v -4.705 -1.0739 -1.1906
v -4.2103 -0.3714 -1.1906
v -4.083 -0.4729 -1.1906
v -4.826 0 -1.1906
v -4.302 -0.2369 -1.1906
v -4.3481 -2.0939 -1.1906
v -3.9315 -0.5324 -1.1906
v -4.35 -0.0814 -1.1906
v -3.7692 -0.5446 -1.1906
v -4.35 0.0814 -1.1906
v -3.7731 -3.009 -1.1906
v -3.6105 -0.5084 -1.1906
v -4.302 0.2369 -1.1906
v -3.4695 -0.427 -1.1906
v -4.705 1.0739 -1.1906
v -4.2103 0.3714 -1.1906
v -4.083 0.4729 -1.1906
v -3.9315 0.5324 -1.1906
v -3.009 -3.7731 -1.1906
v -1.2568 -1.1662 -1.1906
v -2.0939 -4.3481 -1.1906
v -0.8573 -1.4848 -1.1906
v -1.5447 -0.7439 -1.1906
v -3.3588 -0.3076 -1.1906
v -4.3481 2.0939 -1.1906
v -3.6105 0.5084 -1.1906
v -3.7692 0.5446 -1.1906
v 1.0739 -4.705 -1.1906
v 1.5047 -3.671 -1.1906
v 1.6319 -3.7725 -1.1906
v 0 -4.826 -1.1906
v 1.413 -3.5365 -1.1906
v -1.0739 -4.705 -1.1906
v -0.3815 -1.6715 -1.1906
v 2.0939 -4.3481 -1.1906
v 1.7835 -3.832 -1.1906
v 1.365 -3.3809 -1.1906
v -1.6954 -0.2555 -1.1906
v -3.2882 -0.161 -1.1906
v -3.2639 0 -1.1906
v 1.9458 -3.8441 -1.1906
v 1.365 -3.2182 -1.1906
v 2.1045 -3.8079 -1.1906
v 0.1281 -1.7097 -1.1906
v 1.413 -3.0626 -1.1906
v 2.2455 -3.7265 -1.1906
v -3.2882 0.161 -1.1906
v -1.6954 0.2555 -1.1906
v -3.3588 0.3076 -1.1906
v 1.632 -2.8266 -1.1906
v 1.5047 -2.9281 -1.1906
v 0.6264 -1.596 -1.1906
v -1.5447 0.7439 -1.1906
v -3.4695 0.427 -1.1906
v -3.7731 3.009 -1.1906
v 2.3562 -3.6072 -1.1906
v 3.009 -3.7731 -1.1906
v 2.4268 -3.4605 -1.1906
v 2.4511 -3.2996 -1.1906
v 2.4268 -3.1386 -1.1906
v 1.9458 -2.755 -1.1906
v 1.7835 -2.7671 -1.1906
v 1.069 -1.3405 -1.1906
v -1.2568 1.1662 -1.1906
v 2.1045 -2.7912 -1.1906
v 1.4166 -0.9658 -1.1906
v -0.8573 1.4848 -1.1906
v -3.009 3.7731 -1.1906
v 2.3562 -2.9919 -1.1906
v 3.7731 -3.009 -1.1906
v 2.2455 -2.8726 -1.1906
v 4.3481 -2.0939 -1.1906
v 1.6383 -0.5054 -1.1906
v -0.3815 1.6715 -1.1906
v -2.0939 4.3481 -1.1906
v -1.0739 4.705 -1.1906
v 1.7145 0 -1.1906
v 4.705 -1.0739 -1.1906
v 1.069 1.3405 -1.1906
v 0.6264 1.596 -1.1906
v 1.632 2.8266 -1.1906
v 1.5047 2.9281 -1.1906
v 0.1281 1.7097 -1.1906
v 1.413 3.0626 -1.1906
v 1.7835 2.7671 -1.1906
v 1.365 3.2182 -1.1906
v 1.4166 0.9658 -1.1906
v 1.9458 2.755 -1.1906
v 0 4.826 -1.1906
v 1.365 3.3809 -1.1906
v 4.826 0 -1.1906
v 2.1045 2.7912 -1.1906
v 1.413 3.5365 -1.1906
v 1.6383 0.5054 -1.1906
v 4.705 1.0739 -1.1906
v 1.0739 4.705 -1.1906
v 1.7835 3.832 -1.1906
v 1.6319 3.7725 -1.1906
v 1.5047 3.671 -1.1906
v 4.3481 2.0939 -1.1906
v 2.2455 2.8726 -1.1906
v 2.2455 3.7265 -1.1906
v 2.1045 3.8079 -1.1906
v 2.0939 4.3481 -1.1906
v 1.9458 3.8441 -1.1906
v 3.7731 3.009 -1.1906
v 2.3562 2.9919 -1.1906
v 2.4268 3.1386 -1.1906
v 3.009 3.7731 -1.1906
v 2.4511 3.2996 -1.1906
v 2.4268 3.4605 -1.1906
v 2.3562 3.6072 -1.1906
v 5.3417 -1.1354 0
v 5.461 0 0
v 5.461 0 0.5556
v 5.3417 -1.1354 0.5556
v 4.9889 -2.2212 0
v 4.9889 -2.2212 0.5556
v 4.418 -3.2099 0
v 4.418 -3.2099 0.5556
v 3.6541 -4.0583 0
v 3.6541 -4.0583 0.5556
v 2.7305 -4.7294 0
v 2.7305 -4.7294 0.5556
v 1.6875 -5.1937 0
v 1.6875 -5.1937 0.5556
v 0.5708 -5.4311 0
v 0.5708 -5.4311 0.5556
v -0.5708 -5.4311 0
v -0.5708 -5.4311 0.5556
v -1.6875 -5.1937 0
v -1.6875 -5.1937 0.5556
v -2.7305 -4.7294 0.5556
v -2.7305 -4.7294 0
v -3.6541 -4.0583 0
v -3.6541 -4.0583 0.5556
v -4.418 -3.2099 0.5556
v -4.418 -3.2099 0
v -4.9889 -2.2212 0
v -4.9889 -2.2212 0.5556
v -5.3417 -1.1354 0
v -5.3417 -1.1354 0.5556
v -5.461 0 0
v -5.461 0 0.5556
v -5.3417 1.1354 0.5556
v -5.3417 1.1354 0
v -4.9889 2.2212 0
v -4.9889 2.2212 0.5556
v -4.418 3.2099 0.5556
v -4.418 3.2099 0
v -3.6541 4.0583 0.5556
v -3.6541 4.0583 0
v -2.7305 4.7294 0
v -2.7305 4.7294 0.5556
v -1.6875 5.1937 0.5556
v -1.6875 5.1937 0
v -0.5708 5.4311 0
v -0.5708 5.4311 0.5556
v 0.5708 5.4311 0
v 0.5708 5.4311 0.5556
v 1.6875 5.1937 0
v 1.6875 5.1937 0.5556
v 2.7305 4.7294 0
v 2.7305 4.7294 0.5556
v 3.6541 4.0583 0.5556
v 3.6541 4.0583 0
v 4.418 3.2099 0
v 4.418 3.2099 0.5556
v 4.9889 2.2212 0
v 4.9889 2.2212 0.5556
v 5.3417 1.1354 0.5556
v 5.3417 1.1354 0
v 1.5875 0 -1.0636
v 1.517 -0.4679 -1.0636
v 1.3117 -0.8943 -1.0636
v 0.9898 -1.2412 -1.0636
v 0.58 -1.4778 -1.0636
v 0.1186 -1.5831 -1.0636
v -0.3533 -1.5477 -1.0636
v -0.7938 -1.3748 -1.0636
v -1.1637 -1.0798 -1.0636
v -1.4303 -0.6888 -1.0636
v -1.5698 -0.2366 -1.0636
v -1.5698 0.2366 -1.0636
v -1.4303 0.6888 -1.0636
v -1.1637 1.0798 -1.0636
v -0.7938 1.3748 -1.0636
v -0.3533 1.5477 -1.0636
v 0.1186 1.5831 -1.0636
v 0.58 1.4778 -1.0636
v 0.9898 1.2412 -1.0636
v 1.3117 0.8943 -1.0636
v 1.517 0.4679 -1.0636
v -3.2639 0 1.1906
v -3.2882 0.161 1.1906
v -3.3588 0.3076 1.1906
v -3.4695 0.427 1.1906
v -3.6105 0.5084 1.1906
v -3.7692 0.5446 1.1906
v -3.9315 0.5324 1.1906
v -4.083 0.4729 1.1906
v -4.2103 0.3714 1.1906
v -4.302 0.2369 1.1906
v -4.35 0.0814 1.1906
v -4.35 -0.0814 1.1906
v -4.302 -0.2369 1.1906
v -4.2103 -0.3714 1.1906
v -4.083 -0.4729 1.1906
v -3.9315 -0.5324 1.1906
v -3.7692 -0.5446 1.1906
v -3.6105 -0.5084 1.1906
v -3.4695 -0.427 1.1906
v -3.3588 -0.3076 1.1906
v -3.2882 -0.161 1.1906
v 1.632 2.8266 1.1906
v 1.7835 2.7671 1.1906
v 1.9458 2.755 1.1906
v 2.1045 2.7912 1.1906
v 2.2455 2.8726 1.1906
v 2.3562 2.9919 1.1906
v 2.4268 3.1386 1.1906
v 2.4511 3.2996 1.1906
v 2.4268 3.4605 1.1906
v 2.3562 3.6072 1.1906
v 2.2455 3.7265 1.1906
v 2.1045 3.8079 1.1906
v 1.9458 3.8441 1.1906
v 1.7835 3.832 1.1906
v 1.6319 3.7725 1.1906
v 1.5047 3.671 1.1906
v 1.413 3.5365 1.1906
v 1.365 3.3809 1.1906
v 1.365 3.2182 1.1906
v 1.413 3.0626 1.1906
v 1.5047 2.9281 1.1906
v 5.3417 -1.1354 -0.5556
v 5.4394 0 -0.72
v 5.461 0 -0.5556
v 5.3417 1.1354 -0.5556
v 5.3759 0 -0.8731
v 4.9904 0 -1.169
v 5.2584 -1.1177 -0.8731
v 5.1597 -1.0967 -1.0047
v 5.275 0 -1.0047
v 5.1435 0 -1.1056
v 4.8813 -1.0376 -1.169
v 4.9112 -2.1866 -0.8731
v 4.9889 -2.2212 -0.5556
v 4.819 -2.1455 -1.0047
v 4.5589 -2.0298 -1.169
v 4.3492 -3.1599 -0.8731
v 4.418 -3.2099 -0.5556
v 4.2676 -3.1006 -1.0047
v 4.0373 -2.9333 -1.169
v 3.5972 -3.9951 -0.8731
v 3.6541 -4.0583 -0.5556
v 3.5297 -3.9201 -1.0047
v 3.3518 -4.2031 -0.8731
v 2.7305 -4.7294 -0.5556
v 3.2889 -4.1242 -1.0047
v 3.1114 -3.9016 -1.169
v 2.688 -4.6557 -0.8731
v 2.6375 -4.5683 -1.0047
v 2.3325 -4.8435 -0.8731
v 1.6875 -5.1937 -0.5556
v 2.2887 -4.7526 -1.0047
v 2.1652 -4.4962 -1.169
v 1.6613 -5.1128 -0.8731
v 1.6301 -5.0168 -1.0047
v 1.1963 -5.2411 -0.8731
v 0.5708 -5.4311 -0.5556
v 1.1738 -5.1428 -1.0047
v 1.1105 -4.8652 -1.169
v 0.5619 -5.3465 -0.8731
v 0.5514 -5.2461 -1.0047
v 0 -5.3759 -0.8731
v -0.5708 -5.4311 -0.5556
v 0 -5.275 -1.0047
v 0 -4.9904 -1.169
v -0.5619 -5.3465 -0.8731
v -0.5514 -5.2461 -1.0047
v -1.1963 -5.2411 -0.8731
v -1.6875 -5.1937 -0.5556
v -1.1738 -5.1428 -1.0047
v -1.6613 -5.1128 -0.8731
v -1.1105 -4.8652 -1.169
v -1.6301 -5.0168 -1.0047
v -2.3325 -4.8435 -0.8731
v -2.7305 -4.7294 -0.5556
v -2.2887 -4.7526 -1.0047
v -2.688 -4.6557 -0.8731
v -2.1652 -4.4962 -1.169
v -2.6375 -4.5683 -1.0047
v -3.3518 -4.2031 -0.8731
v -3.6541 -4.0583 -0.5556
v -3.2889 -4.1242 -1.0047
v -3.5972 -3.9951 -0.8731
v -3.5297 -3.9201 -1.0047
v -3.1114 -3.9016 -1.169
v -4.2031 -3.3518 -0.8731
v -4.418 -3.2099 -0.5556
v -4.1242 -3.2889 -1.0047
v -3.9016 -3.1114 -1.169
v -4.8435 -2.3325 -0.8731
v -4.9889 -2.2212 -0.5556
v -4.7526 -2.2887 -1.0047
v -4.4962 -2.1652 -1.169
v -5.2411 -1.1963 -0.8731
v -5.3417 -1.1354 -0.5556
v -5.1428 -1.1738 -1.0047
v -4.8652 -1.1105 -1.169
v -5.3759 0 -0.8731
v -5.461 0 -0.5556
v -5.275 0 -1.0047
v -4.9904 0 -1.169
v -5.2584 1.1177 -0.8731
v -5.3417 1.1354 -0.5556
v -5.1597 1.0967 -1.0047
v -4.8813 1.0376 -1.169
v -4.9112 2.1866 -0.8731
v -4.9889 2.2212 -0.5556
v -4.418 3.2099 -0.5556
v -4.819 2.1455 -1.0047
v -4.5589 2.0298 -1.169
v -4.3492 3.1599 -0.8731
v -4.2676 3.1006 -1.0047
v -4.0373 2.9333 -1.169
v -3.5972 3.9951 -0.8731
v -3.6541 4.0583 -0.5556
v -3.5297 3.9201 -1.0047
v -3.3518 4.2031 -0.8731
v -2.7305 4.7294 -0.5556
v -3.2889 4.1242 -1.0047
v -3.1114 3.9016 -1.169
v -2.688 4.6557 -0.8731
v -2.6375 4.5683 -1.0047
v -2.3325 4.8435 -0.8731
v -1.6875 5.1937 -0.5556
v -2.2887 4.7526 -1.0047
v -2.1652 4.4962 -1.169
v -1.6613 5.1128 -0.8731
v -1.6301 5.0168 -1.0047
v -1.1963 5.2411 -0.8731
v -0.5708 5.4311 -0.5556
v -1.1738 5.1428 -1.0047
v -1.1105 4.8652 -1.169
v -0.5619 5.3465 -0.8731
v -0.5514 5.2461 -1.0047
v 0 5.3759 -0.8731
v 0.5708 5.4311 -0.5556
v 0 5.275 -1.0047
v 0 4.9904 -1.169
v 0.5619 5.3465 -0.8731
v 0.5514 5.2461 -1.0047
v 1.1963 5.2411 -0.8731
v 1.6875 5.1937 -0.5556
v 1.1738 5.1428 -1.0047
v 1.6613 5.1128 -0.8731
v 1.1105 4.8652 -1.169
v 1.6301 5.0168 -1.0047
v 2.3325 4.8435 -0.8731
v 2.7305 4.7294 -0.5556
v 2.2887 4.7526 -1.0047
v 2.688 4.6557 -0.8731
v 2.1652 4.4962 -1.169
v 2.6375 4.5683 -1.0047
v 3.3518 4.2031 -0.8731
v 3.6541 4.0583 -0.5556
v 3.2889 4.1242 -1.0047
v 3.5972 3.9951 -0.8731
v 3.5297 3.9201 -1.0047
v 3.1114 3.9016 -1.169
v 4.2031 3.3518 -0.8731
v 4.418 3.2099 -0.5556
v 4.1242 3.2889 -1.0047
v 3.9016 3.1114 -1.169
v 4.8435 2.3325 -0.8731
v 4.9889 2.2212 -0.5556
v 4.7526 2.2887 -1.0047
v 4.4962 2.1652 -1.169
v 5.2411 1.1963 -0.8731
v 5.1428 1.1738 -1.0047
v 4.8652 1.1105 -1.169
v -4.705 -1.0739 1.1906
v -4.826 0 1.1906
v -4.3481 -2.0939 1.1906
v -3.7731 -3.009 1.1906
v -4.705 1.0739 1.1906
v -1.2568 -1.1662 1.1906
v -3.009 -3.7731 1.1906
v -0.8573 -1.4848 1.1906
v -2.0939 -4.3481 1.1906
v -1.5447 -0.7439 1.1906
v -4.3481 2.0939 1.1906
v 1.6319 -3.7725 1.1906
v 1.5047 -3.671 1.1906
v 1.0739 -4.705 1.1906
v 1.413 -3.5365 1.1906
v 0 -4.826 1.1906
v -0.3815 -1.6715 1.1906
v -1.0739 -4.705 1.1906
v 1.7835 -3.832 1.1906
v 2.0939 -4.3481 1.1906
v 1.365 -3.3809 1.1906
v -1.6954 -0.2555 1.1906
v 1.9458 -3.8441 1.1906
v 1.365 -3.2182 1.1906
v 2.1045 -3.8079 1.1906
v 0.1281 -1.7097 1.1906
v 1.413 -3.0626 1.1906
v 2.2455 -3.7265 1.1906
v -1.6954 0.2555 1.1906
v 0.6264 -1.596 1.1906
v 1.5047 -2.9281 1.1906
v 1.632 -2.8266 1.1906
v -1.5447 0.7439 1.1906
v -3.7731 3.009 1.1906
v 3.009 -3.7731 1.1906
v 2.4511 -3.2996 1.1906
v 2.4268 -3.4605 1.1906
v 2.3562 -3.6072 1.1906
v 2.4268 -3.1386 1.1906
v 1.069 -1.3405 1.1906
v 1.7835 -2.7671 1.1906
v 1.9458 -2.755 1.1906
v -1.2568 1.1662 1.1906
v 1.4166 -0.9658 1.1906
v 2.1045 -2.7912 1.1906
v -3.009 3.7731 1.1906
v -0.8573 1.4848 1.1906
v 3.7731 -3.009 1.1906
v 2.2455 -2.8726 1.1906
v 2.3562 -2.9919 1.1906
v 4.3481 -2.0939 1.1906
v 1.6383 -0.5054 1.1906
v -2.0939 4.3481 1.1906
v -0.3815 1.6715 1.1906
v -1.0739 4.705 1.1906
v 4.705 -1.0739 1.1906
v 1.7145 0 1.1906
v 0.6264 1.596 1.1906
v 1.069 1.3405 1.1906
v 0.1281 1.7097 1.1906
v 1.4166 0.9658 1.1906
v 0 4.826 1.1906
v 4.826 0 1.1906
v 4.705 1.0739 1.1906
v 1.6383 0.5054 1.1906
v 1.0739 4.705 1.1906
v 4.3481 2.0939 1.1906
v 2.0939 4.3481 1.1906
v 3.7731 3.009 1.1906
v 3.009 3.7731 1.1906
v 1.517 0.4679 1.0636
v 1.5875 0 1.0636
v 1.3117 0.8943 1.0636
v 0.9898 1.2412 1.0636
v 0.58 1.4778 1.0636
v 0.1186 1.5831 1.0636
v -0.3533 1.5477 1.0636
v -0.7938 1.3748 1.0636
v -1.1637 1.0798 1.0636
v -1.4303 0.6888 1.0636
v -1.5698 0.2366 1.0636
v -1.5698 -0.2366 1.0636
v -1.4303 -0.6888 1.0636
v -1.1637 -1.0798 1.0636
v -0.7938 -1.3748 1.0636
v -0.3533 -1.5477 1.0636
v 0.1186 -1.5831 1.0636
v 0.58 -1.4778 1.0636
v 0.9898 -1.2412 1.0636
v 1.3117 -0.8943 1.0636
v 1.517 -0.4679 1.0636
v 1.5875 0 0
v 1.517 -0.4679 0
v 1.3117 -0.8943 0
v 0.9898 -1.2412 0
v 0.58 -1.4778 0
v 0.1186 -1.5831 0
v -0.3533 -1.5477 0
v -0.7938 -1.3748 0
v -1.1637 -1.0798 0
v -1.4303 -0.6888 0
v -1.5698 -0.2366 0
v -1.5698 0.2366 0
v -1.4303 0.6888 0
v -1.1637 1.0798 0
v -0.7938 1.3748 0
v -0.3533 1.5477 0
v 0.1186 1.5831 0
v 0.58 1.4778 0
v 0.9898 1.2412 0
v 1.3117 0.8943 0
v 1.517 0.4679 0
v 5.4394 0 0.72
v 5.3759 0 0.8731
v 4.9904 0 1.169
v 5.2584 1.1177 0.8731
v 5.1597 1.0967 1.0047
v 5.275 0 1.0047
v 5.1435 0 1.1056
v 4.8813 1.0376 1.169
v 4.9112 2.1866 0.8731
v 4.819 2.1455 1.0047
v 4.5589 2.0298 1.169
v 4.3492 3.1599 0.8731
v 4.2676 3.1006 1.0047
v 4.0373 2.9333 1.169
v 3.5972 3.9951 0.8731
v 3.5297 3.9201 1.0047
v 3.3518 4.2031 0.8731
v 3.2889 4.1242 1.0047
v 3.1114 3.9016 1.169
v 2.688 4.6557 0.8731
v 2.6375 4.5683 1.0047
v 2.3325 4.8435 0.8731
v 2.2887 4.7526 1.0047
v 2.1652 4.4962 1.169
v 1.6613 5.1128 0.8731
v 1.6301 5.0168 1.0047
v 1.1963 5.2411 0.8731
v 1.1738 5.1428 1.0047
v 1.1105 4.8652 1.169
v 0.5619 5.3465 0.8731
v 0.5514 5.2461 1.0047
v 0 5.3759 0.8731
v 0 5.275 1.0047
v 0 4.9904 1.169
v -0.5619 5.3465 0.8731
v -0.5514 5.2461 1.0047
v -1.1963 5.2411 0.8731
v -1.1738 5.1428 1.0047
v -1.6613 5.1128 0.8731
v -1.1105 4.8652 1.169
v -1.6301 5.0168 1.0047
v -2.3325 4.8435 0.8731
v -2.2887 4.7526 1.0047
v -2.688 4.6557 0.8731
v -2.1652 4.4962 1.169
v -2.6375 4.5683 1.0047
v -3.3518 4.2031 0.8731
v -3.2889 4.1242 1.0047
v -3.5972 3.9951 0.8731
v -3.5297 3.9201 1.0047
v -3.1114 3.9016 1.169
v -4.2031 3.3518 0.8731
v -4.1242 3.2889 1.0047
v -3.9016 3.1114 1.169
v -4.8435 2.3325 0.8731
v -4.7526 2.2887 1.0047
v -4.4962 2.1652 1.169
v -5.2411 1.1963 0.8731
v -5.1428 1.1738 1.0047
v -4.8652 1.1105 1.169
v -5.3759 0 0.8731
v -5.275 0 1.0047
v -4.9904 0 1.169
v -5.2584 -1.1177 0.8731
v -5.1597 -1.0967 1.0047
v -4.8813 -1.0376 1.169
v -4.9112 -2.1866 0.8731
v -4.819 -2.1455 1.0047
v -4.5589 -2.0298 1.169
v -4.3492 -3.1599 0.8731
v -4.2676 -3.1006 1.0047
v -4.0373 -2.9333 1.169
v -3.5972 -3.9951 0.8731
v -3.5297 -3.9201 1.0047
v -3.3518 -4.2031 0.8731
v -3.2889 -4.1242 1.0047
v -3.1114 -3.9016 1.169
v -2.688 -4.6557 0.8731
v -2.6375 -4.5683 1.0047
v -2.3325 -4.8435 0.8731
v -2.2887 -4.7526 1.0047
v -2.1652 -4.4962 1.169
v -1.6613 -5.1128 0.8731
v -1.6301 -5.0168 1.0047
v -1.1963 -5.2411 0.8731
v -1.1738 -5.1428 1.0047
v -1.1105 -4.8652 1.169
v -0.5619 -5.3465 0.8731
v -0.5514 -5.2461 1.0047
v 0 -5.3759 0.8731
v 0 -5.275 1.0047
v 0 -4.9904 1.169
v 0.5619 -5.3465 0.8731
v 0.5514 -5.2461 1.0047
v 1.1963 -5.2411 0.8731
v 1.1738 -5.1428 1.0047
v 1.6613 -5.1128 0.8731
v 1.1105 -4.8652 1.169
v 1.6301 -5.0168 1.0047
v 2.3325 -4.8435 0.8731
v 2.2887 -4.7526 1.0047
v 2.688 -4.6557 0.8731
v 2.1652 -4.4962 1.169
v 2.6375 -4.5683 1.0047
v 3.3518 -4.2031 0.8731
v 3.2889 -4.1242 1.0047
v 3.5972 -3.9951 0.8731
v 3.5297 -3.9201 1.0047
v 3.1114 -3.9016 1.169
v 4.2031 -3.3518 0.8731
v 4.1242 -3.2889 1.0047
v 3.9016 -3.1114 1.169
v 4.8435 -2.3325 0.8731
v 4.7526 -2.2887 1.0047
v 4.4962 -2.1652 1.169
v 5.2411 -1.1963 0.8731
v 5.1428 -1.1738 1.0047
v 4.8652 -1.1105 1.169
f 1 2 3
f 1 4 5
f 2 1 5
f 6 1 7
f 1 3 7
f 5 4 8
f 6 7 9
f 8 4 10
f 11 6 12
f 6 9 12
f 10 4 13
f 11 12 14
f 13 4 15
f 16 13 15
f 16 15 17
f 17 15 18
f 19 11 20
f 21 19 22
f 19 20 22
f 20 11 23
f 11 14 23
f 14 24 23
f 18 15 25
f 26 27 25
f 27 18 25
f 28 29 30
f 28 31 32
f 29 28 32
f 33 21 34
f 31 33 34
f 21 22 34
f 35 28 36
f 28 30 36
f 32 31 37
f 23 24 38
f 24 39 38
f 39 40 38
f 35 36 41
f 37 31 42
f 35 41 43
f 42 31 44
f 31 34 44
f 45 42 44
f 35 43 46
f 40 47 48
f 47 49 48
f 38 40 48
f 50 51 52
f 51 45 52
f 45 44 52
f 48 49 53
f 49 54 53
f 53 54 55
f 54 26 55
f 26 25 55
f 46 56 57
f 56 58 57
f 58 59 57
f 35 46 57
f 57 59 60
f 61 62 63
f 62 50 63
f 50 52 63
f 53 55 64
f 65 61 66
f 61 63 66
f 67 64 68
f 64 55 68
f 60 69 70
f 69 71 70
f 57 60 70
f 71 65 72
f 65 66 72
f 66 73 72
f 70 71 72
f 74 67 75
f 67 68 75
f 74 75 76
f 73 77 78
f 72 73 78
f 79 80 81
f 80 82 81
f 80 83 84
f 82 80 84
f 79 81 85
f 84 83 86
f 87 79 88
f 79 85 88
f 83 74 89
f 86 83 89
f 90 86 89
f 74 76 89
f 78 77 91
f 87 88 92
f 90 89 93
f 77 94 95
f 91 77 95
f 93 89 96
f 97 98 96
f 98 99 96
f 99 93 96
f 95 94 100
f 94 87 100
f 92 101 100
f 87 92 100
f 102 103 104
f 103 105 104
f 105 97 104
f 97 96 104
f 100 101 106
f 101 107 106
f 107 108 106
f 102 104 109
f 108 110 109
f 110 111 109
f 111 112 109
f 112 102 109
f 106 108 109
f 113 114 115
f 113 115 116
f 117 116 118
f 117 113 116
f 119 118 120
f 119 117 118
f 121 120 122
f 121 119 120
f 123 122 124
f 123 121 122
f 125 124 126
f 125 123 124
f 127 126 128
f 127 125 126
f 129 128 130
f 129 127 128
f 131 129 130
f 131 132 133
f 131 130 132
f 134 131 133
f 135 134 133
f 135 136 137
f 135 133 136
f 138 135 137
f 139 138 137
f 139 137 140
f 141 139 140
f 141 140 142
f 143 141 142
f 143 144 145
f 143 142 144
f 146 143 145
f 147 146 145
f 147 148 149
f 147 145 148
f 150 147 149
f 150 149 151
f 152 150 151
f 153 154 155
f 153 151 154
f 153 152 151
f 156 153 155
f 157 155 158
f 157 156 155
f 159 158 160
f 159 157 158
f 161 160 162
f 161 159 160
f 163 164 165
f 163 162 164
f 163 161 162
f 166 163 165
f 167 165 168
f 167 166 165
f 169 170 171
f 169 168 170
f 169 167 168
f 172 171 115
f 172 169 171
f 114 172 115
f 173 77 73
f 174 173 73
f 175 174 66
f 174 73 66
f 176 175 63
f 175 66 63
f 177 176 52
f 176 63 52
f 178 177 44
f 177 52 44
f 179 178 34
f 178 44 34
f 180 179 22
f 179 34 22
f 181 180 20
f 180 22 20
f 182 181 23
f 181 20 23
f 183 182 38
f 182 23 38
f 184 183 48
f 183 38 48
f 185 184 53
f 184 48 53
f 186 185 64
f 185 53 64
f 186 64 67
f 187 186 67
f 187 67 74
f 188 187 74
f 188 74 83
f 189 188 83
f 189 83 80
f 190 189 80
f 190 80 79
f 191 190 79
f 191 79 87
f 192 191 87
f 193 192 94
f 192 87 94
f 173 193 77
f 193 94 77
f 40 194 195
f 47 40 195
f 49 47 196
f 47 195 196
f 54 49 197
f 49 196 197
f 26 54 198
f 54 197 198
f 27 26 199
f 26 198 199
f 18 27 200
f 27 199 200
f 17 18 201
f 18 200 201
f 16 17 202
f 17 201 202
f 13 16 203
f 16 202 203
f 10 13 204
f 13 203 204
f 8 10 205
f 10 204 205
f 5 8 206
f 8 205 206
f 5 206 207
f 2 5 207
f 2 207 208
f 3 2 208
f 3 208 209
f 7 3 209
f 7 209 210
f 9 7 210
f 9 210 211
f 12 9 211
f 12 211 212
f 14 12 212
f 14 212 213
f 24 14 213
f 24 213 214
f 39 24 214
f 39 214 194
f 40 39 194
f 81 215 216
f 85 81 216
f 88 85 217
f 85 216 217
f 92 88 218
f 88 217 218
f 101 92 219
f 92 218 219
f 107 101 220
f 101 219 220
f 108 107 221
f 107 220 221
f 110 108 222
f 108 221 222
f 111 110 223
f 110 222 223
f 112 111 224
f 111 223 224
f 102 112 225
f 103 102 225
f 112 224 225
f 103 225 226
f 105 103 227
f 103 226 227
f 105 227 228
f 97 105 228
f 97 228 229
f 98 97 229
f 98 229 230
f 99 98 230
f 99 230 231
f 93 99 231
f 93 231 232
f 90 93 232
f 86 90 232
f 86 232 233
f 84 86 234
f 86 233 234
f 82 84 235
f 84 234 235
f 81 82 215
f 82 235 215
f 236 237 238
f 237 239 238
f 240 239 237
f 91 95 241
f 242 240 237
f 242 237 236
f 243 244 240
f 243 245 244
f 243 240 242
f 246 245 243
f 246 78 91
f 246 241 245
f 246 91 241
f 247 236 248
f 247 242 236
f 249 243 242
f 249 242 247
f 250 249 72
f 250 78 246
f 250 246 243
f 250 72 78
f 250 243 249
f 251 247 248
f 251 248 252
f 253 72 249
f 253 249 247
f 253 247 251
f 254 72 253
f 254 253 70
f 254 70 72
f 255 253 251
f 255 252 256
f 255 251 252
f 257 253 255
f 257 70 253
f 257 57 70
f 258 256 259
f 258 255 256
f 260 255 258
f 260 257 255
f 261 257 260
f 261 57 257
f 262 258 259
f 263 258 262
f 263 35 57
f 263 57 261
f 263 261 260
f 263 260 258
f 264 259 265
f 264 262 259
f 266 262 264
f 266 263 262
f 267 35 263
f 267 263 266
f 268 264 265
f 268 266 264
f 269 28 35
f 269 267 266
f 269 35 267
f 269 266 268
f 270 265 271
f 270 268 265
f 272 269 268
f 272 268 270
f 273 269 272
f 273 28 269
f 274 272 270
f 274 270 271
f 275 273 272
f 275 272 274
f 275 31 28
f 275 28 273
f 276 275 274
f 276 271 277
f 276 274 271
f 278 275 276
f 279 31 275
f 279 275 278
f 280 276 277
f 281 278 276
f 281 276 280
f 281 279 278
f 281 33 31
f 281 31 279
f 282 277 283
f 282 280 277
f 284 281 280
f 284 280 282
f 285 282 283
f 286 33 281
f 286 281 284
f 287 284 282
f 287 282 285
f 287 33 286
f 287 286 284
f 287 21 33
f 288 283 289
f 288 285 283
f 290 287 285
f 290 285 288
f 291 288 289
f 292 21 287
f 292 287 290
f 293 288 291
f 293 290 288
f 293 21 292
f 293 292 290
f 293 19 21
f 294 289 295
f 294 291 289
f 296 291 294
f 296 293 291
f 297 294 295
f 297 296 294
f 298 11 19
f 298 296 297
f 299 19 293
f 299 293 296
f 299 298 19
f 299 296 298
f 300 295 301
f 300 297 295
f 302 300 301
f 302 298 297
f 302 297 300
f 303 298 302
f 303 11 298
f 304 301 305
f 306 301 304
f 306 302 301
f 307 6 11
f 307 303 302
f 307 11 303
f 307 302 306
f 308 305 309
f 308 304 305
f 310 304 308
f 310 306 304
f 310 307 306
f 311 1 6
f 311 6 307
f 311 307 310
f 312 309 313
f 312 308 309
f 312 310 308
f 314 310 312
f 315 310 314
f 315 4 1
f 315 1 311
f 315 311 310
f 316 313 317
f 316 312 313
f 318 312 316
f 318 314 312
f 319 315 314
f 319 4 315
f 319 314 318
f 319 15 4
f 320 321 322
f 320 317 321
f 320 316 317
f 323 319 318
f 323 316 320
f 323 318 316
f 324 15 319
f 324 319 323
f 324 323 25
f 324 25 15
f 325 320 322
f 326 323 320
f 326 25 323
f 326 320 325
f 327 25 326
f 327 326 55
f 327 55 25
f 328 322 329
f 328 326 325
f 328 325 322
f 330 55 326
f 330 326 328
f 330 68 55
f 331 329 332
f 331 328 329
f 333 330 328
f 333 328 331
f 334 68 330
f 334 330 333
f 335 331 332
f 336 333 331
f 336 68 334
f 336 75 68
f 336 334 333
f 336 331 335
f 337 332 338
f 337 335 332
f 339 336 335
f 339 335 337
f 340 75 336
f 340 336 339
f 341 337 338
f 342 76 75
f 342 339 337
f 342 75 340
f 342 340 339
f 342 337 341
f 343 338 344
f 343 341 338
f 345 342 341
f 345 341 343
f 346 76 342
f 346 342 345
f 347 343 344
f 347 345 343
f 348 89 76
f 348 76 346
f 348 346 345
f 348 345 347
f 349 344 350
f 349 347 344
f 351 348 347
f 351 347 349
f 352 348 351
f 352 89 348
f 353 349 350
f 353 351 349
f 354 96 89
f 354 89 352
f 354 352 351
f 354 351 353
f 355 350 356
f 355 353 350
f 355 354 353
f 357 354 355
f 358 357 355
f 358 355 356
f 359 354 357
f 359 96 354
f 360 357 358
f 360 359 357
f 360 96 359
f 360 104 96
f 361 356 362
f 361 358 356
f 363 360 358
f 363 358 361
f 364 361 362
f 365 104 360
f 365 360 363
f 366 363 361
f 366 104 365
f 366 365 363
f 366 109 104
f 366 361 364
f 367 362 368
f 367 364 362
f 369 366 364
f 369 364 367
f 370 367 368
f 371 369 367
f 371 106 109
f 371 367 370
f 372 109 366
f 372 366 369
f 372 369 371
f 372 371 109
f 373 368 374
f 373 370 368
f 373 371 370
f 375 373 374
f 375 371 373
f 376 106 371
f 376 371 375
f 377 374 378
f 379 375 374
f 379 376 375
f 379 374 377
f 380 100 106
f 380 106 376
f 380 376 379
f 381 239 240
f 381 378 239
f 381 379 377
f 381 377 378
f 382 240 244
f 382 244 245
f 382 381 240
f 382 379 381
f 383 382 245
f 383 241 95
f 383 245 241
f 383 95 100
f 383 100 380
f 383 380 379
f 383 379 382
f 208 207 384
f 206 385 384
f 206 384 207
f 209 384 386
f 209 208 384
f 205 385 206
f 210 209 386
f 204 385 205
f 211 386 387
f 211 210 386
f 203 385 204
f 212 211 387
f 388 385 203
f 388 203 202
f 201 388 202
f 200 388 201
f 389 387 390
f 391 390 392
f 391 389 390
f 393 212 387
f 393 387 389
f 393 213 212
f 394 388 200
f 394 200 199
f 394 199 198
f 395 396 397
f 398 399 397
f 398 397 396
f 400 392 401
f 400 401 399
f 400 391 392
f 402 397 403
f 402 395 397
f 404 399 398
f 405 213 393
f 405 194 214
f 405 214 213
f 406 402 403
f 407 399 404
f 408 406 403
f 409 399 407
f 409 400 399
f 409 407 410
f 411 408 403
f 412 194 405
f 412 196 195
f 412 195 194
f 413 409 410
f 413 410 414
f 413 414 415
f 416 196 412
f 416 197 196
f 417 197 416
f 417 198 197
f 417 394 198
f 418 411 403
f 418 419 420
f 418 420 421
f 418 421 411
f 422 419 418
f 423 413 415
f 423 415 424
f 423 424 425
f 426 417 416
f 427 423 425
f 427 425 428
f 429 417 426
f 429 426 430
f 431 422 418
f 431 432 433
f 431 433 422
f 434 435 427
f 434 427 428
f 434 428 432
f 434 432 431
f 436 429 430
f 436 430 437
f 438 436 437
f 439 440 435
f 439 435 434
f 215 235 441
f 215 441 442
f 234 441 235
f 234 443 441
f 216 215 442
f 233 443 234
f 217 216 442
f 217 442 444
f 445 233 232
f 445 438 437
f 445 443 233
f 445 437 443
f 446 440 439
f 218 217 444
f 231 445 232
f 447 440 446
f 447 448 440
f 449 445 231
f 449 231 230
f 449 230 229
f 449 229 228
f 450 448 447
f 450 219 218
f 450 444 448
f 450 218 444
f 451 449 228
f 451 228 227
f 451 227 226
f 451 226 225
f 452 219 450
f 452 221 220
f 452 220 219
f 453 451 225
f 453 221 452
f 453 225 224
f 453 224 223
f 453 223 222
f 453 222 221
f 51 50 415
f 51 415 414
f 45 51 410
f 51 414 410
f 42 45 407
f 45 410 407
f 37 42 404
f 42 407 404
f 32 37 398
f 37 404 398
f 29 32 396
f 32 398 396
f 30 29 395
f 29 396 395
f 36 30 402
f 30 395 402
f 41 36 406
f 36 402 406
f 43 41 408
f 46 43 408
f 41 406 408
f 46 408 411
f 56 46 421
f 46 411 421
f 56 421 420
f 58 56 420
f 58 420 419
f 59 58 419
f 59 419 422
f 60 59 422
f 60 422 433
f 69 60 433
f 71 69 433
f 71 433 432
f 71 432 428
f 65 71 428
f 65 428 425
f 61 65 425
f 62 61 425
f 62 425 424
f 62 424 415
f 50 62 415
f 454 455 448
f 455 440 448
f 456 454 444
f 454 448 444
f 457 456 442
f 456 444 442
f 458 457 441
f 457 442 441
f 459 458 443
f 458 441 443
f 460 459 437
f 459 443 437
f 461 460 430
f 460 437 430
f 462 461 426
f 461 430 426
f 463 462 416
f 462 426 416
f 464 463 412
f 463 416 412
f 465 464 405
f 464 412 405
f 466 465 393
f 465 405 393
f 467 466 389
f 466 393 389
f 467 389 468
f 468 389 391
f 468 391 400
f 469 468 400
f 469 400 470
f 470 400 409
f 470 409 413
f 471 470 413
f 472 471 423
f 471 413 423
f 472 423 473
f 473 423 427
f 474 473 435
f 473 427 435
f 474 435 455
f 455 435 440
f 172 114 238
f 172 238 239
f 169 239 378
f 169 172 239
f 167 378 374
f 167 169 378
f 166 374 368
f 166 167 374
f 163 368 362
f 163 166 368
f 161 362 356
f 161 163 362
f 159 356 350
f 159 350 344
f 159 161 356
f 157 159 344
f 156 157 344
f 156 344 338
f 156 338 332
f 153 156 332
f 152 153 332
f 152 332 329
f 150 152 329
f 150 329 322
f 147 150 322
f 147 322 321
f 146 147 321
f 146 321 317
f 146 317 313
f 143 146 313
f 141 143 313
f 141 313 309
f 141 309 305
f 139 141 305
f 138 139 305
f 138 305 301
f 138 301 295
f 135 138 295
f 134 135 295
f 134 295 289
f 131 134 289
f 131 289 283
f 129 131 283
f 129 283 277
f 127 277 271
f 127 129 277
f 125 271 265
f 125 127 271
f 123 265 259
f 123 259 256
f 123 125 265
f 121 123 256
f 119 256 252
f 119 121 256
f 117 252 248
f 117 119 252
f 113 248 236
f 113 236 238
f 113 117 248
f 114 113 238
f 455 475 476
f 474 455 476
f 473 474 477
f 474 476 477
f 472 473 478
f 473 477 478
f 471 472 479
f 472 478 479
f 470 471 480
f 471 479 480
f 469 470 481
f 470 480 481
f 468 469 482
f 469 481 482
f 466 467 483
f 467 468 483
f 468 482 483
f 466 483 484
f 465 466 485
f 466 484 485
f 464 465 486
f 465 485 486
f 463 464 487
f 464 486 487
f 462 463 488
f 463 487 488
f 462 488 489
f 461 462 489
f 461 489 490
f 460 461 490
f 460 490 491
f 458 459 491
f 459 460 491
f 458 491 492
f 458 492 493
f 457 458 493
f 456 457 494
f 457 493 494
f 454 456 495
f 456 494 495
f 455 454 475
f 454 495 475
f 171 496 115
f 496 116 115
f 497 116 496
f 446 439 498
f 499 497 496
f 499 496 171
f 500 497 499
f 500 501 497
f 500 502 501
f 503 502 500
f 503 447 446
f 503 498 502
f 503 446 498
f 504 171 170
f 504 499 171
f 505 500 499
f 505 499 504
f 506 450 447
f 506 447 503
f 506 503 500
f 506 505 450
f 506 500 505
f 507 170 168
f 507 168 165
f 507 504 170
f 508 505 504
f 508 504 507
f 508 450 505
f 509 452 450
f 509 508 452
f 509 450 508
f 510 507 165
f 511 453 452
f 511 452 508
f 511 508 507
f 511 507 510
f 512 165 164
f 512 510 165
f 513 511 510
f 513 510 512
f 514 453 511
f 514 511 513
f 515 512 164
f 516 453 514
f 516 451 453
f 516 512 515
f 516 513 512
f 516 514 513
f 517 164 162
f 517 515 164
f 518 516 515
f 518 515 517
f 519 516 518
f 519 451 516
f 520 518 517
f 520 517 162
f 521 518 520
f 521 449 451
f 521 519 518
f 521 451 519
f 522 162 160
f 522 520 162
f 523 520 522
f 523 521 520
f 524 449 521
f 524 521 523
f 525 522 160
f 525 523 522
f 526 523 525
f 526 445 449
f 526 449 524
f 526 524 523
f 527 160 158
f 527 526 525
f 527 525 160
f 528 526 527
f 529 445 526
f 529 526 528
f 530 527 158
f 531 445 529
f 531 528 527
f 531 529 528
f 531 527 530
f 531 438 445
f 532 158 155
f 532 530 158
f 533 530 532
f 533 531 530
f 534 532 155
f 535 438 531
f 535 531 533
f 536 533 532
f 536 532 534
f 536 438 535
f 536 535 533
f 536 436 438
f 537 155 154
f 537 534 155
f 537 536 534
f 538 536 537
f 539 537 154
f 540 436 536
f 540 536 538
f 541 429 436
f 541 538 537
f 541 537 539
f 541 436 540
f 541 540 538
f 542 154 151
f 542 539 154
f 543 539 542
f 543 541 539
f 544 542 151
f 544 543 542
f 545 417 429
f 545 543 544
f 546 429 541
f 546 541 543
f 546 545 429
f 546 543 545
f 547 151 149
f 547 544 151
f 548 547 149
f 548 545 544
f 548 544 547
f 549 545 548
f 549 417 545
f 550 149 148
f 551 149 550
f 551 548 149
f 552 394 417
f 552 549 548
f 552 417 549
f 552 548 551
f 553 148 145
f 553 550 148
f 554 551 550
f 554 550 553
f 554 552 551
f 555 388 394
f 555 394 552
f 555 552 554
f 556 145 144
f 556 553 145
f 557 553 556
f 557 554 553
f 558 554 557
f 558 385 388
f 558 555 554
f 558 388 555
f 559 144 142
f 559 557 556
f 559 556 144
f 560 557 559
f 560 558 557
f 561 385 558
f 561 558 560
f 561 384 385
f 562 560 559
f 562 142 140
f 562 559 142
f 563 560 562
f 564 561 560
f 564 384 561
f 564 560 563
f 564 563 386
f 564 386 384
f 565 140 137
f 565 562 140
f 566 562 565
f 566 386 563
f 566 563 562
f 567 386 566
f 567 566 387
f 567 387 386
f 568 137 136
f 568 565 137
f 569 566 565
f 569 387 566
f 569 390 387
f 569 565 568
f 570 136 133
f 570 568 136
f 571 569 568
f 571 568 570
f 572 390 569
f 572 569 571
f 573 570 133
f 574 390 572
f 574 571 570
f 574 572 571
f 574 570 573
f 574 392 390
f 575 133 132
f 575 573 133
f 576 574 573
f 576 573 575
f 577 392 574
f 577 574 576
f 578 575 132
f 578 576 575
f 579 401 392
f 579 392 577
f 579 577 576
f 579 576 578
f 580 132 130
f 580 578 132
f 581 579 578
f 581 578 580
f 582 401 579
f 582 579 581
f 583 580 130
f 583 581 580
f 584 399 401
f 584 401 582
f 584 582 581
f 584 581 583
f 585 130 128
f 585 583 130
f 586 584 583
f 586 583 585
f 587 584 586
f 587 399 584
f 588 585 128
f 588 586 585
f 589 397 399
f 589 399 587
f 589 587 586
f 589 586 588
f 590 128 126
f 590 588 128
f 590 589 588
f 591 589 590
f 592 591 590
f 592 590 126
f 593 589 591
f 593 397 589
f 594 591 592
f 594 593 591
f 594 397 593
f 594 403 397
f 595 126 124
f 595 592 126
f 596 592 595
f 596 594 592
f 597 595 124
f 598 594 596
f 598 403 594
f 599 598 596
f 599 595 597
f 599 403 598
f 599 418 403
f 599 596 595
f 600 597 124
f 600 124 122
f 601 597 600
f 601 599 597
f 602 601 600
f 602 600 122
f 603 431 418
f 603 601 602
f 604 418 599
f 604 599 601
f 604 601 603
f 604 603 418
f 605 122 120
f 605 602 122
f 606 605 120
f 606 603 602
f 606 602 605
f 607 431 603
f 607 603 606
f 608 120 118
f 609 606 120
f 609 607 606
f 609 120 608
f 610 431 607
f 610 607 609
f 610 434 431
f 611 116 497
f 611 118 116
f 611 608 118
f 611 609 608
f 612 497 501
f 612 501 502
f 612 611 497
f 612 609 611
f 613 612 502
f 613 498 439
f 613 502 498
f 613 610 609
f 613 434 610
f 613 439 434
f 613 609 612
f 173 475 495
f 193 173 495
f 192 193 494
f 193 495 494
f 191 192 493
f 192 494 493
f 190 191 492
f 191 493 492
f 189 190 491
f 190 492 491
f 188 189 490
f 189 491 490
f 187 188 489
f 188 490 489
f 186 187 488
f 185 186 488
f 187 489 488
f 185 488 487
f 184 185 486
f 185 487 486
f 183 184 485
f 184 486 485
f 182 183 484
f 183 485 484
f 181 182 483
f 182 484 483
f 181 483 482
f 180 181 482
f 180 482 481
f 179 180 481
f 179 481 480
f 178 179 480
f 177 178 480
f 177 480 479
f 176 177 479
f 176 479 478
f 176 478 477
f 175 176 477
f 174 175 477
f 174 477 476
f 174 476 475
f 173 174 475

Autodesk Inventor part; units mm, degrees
ref_plane "YZ Plane" through (0, 0, 0) normal (1, 0, 0) x (0, 1, 0)
ref_plane "XZ Plane" through (0, 0, 0) normal (0, 1, 0) x (-1, 0, 0)
ref_plane "XY Plane" through (0, 0, 0) normal (0, 0, 1) x (1, 0, 0)
sketch "Sketch1" plane through (0, 0, 0) normal (0, 0, 1) x (1, 0, 0)
  circle A0 centre (0, 0) radius 1.5875
  circle A1 centre (0, 0) radius 5.461
  dimension "d0" = 3.175
  dimension "d1" = 10.922
extrude "Extrusion1" add sketch "Sketch1" along normal mid plane 2.3813
fillet "Fillet1" radius 0.635 2 edges at (-5.461, 0, 1.1906) (-5.461, 0, -1.1906)
chamfer "Chamfer1" distance 0.127 angle 45 2 edges at (-1.5875, 0, 1.1906) (-1.5875, 0, -1.1906)
sketch "Sketch2" plane through (0, 0, 1.1906) normal (0, 0, 1) x (1, 0, 0)
  circle A0 centre (-3.81, 0) radius 0.5461
  point P0 (0, 0)
  dimension "d8" = 1.0922
  dimension "d9" = 3.81
extrude "Extrusion2" cut sketch "Sketch2" along normal through all both and the other way through all
pattern_circular "Circular Pattern1" count 3 over 360 about axis through (0, 0, -10) along (0, 0, 1) of "Extrusion2"
properties part number "Piston of Suspension"
